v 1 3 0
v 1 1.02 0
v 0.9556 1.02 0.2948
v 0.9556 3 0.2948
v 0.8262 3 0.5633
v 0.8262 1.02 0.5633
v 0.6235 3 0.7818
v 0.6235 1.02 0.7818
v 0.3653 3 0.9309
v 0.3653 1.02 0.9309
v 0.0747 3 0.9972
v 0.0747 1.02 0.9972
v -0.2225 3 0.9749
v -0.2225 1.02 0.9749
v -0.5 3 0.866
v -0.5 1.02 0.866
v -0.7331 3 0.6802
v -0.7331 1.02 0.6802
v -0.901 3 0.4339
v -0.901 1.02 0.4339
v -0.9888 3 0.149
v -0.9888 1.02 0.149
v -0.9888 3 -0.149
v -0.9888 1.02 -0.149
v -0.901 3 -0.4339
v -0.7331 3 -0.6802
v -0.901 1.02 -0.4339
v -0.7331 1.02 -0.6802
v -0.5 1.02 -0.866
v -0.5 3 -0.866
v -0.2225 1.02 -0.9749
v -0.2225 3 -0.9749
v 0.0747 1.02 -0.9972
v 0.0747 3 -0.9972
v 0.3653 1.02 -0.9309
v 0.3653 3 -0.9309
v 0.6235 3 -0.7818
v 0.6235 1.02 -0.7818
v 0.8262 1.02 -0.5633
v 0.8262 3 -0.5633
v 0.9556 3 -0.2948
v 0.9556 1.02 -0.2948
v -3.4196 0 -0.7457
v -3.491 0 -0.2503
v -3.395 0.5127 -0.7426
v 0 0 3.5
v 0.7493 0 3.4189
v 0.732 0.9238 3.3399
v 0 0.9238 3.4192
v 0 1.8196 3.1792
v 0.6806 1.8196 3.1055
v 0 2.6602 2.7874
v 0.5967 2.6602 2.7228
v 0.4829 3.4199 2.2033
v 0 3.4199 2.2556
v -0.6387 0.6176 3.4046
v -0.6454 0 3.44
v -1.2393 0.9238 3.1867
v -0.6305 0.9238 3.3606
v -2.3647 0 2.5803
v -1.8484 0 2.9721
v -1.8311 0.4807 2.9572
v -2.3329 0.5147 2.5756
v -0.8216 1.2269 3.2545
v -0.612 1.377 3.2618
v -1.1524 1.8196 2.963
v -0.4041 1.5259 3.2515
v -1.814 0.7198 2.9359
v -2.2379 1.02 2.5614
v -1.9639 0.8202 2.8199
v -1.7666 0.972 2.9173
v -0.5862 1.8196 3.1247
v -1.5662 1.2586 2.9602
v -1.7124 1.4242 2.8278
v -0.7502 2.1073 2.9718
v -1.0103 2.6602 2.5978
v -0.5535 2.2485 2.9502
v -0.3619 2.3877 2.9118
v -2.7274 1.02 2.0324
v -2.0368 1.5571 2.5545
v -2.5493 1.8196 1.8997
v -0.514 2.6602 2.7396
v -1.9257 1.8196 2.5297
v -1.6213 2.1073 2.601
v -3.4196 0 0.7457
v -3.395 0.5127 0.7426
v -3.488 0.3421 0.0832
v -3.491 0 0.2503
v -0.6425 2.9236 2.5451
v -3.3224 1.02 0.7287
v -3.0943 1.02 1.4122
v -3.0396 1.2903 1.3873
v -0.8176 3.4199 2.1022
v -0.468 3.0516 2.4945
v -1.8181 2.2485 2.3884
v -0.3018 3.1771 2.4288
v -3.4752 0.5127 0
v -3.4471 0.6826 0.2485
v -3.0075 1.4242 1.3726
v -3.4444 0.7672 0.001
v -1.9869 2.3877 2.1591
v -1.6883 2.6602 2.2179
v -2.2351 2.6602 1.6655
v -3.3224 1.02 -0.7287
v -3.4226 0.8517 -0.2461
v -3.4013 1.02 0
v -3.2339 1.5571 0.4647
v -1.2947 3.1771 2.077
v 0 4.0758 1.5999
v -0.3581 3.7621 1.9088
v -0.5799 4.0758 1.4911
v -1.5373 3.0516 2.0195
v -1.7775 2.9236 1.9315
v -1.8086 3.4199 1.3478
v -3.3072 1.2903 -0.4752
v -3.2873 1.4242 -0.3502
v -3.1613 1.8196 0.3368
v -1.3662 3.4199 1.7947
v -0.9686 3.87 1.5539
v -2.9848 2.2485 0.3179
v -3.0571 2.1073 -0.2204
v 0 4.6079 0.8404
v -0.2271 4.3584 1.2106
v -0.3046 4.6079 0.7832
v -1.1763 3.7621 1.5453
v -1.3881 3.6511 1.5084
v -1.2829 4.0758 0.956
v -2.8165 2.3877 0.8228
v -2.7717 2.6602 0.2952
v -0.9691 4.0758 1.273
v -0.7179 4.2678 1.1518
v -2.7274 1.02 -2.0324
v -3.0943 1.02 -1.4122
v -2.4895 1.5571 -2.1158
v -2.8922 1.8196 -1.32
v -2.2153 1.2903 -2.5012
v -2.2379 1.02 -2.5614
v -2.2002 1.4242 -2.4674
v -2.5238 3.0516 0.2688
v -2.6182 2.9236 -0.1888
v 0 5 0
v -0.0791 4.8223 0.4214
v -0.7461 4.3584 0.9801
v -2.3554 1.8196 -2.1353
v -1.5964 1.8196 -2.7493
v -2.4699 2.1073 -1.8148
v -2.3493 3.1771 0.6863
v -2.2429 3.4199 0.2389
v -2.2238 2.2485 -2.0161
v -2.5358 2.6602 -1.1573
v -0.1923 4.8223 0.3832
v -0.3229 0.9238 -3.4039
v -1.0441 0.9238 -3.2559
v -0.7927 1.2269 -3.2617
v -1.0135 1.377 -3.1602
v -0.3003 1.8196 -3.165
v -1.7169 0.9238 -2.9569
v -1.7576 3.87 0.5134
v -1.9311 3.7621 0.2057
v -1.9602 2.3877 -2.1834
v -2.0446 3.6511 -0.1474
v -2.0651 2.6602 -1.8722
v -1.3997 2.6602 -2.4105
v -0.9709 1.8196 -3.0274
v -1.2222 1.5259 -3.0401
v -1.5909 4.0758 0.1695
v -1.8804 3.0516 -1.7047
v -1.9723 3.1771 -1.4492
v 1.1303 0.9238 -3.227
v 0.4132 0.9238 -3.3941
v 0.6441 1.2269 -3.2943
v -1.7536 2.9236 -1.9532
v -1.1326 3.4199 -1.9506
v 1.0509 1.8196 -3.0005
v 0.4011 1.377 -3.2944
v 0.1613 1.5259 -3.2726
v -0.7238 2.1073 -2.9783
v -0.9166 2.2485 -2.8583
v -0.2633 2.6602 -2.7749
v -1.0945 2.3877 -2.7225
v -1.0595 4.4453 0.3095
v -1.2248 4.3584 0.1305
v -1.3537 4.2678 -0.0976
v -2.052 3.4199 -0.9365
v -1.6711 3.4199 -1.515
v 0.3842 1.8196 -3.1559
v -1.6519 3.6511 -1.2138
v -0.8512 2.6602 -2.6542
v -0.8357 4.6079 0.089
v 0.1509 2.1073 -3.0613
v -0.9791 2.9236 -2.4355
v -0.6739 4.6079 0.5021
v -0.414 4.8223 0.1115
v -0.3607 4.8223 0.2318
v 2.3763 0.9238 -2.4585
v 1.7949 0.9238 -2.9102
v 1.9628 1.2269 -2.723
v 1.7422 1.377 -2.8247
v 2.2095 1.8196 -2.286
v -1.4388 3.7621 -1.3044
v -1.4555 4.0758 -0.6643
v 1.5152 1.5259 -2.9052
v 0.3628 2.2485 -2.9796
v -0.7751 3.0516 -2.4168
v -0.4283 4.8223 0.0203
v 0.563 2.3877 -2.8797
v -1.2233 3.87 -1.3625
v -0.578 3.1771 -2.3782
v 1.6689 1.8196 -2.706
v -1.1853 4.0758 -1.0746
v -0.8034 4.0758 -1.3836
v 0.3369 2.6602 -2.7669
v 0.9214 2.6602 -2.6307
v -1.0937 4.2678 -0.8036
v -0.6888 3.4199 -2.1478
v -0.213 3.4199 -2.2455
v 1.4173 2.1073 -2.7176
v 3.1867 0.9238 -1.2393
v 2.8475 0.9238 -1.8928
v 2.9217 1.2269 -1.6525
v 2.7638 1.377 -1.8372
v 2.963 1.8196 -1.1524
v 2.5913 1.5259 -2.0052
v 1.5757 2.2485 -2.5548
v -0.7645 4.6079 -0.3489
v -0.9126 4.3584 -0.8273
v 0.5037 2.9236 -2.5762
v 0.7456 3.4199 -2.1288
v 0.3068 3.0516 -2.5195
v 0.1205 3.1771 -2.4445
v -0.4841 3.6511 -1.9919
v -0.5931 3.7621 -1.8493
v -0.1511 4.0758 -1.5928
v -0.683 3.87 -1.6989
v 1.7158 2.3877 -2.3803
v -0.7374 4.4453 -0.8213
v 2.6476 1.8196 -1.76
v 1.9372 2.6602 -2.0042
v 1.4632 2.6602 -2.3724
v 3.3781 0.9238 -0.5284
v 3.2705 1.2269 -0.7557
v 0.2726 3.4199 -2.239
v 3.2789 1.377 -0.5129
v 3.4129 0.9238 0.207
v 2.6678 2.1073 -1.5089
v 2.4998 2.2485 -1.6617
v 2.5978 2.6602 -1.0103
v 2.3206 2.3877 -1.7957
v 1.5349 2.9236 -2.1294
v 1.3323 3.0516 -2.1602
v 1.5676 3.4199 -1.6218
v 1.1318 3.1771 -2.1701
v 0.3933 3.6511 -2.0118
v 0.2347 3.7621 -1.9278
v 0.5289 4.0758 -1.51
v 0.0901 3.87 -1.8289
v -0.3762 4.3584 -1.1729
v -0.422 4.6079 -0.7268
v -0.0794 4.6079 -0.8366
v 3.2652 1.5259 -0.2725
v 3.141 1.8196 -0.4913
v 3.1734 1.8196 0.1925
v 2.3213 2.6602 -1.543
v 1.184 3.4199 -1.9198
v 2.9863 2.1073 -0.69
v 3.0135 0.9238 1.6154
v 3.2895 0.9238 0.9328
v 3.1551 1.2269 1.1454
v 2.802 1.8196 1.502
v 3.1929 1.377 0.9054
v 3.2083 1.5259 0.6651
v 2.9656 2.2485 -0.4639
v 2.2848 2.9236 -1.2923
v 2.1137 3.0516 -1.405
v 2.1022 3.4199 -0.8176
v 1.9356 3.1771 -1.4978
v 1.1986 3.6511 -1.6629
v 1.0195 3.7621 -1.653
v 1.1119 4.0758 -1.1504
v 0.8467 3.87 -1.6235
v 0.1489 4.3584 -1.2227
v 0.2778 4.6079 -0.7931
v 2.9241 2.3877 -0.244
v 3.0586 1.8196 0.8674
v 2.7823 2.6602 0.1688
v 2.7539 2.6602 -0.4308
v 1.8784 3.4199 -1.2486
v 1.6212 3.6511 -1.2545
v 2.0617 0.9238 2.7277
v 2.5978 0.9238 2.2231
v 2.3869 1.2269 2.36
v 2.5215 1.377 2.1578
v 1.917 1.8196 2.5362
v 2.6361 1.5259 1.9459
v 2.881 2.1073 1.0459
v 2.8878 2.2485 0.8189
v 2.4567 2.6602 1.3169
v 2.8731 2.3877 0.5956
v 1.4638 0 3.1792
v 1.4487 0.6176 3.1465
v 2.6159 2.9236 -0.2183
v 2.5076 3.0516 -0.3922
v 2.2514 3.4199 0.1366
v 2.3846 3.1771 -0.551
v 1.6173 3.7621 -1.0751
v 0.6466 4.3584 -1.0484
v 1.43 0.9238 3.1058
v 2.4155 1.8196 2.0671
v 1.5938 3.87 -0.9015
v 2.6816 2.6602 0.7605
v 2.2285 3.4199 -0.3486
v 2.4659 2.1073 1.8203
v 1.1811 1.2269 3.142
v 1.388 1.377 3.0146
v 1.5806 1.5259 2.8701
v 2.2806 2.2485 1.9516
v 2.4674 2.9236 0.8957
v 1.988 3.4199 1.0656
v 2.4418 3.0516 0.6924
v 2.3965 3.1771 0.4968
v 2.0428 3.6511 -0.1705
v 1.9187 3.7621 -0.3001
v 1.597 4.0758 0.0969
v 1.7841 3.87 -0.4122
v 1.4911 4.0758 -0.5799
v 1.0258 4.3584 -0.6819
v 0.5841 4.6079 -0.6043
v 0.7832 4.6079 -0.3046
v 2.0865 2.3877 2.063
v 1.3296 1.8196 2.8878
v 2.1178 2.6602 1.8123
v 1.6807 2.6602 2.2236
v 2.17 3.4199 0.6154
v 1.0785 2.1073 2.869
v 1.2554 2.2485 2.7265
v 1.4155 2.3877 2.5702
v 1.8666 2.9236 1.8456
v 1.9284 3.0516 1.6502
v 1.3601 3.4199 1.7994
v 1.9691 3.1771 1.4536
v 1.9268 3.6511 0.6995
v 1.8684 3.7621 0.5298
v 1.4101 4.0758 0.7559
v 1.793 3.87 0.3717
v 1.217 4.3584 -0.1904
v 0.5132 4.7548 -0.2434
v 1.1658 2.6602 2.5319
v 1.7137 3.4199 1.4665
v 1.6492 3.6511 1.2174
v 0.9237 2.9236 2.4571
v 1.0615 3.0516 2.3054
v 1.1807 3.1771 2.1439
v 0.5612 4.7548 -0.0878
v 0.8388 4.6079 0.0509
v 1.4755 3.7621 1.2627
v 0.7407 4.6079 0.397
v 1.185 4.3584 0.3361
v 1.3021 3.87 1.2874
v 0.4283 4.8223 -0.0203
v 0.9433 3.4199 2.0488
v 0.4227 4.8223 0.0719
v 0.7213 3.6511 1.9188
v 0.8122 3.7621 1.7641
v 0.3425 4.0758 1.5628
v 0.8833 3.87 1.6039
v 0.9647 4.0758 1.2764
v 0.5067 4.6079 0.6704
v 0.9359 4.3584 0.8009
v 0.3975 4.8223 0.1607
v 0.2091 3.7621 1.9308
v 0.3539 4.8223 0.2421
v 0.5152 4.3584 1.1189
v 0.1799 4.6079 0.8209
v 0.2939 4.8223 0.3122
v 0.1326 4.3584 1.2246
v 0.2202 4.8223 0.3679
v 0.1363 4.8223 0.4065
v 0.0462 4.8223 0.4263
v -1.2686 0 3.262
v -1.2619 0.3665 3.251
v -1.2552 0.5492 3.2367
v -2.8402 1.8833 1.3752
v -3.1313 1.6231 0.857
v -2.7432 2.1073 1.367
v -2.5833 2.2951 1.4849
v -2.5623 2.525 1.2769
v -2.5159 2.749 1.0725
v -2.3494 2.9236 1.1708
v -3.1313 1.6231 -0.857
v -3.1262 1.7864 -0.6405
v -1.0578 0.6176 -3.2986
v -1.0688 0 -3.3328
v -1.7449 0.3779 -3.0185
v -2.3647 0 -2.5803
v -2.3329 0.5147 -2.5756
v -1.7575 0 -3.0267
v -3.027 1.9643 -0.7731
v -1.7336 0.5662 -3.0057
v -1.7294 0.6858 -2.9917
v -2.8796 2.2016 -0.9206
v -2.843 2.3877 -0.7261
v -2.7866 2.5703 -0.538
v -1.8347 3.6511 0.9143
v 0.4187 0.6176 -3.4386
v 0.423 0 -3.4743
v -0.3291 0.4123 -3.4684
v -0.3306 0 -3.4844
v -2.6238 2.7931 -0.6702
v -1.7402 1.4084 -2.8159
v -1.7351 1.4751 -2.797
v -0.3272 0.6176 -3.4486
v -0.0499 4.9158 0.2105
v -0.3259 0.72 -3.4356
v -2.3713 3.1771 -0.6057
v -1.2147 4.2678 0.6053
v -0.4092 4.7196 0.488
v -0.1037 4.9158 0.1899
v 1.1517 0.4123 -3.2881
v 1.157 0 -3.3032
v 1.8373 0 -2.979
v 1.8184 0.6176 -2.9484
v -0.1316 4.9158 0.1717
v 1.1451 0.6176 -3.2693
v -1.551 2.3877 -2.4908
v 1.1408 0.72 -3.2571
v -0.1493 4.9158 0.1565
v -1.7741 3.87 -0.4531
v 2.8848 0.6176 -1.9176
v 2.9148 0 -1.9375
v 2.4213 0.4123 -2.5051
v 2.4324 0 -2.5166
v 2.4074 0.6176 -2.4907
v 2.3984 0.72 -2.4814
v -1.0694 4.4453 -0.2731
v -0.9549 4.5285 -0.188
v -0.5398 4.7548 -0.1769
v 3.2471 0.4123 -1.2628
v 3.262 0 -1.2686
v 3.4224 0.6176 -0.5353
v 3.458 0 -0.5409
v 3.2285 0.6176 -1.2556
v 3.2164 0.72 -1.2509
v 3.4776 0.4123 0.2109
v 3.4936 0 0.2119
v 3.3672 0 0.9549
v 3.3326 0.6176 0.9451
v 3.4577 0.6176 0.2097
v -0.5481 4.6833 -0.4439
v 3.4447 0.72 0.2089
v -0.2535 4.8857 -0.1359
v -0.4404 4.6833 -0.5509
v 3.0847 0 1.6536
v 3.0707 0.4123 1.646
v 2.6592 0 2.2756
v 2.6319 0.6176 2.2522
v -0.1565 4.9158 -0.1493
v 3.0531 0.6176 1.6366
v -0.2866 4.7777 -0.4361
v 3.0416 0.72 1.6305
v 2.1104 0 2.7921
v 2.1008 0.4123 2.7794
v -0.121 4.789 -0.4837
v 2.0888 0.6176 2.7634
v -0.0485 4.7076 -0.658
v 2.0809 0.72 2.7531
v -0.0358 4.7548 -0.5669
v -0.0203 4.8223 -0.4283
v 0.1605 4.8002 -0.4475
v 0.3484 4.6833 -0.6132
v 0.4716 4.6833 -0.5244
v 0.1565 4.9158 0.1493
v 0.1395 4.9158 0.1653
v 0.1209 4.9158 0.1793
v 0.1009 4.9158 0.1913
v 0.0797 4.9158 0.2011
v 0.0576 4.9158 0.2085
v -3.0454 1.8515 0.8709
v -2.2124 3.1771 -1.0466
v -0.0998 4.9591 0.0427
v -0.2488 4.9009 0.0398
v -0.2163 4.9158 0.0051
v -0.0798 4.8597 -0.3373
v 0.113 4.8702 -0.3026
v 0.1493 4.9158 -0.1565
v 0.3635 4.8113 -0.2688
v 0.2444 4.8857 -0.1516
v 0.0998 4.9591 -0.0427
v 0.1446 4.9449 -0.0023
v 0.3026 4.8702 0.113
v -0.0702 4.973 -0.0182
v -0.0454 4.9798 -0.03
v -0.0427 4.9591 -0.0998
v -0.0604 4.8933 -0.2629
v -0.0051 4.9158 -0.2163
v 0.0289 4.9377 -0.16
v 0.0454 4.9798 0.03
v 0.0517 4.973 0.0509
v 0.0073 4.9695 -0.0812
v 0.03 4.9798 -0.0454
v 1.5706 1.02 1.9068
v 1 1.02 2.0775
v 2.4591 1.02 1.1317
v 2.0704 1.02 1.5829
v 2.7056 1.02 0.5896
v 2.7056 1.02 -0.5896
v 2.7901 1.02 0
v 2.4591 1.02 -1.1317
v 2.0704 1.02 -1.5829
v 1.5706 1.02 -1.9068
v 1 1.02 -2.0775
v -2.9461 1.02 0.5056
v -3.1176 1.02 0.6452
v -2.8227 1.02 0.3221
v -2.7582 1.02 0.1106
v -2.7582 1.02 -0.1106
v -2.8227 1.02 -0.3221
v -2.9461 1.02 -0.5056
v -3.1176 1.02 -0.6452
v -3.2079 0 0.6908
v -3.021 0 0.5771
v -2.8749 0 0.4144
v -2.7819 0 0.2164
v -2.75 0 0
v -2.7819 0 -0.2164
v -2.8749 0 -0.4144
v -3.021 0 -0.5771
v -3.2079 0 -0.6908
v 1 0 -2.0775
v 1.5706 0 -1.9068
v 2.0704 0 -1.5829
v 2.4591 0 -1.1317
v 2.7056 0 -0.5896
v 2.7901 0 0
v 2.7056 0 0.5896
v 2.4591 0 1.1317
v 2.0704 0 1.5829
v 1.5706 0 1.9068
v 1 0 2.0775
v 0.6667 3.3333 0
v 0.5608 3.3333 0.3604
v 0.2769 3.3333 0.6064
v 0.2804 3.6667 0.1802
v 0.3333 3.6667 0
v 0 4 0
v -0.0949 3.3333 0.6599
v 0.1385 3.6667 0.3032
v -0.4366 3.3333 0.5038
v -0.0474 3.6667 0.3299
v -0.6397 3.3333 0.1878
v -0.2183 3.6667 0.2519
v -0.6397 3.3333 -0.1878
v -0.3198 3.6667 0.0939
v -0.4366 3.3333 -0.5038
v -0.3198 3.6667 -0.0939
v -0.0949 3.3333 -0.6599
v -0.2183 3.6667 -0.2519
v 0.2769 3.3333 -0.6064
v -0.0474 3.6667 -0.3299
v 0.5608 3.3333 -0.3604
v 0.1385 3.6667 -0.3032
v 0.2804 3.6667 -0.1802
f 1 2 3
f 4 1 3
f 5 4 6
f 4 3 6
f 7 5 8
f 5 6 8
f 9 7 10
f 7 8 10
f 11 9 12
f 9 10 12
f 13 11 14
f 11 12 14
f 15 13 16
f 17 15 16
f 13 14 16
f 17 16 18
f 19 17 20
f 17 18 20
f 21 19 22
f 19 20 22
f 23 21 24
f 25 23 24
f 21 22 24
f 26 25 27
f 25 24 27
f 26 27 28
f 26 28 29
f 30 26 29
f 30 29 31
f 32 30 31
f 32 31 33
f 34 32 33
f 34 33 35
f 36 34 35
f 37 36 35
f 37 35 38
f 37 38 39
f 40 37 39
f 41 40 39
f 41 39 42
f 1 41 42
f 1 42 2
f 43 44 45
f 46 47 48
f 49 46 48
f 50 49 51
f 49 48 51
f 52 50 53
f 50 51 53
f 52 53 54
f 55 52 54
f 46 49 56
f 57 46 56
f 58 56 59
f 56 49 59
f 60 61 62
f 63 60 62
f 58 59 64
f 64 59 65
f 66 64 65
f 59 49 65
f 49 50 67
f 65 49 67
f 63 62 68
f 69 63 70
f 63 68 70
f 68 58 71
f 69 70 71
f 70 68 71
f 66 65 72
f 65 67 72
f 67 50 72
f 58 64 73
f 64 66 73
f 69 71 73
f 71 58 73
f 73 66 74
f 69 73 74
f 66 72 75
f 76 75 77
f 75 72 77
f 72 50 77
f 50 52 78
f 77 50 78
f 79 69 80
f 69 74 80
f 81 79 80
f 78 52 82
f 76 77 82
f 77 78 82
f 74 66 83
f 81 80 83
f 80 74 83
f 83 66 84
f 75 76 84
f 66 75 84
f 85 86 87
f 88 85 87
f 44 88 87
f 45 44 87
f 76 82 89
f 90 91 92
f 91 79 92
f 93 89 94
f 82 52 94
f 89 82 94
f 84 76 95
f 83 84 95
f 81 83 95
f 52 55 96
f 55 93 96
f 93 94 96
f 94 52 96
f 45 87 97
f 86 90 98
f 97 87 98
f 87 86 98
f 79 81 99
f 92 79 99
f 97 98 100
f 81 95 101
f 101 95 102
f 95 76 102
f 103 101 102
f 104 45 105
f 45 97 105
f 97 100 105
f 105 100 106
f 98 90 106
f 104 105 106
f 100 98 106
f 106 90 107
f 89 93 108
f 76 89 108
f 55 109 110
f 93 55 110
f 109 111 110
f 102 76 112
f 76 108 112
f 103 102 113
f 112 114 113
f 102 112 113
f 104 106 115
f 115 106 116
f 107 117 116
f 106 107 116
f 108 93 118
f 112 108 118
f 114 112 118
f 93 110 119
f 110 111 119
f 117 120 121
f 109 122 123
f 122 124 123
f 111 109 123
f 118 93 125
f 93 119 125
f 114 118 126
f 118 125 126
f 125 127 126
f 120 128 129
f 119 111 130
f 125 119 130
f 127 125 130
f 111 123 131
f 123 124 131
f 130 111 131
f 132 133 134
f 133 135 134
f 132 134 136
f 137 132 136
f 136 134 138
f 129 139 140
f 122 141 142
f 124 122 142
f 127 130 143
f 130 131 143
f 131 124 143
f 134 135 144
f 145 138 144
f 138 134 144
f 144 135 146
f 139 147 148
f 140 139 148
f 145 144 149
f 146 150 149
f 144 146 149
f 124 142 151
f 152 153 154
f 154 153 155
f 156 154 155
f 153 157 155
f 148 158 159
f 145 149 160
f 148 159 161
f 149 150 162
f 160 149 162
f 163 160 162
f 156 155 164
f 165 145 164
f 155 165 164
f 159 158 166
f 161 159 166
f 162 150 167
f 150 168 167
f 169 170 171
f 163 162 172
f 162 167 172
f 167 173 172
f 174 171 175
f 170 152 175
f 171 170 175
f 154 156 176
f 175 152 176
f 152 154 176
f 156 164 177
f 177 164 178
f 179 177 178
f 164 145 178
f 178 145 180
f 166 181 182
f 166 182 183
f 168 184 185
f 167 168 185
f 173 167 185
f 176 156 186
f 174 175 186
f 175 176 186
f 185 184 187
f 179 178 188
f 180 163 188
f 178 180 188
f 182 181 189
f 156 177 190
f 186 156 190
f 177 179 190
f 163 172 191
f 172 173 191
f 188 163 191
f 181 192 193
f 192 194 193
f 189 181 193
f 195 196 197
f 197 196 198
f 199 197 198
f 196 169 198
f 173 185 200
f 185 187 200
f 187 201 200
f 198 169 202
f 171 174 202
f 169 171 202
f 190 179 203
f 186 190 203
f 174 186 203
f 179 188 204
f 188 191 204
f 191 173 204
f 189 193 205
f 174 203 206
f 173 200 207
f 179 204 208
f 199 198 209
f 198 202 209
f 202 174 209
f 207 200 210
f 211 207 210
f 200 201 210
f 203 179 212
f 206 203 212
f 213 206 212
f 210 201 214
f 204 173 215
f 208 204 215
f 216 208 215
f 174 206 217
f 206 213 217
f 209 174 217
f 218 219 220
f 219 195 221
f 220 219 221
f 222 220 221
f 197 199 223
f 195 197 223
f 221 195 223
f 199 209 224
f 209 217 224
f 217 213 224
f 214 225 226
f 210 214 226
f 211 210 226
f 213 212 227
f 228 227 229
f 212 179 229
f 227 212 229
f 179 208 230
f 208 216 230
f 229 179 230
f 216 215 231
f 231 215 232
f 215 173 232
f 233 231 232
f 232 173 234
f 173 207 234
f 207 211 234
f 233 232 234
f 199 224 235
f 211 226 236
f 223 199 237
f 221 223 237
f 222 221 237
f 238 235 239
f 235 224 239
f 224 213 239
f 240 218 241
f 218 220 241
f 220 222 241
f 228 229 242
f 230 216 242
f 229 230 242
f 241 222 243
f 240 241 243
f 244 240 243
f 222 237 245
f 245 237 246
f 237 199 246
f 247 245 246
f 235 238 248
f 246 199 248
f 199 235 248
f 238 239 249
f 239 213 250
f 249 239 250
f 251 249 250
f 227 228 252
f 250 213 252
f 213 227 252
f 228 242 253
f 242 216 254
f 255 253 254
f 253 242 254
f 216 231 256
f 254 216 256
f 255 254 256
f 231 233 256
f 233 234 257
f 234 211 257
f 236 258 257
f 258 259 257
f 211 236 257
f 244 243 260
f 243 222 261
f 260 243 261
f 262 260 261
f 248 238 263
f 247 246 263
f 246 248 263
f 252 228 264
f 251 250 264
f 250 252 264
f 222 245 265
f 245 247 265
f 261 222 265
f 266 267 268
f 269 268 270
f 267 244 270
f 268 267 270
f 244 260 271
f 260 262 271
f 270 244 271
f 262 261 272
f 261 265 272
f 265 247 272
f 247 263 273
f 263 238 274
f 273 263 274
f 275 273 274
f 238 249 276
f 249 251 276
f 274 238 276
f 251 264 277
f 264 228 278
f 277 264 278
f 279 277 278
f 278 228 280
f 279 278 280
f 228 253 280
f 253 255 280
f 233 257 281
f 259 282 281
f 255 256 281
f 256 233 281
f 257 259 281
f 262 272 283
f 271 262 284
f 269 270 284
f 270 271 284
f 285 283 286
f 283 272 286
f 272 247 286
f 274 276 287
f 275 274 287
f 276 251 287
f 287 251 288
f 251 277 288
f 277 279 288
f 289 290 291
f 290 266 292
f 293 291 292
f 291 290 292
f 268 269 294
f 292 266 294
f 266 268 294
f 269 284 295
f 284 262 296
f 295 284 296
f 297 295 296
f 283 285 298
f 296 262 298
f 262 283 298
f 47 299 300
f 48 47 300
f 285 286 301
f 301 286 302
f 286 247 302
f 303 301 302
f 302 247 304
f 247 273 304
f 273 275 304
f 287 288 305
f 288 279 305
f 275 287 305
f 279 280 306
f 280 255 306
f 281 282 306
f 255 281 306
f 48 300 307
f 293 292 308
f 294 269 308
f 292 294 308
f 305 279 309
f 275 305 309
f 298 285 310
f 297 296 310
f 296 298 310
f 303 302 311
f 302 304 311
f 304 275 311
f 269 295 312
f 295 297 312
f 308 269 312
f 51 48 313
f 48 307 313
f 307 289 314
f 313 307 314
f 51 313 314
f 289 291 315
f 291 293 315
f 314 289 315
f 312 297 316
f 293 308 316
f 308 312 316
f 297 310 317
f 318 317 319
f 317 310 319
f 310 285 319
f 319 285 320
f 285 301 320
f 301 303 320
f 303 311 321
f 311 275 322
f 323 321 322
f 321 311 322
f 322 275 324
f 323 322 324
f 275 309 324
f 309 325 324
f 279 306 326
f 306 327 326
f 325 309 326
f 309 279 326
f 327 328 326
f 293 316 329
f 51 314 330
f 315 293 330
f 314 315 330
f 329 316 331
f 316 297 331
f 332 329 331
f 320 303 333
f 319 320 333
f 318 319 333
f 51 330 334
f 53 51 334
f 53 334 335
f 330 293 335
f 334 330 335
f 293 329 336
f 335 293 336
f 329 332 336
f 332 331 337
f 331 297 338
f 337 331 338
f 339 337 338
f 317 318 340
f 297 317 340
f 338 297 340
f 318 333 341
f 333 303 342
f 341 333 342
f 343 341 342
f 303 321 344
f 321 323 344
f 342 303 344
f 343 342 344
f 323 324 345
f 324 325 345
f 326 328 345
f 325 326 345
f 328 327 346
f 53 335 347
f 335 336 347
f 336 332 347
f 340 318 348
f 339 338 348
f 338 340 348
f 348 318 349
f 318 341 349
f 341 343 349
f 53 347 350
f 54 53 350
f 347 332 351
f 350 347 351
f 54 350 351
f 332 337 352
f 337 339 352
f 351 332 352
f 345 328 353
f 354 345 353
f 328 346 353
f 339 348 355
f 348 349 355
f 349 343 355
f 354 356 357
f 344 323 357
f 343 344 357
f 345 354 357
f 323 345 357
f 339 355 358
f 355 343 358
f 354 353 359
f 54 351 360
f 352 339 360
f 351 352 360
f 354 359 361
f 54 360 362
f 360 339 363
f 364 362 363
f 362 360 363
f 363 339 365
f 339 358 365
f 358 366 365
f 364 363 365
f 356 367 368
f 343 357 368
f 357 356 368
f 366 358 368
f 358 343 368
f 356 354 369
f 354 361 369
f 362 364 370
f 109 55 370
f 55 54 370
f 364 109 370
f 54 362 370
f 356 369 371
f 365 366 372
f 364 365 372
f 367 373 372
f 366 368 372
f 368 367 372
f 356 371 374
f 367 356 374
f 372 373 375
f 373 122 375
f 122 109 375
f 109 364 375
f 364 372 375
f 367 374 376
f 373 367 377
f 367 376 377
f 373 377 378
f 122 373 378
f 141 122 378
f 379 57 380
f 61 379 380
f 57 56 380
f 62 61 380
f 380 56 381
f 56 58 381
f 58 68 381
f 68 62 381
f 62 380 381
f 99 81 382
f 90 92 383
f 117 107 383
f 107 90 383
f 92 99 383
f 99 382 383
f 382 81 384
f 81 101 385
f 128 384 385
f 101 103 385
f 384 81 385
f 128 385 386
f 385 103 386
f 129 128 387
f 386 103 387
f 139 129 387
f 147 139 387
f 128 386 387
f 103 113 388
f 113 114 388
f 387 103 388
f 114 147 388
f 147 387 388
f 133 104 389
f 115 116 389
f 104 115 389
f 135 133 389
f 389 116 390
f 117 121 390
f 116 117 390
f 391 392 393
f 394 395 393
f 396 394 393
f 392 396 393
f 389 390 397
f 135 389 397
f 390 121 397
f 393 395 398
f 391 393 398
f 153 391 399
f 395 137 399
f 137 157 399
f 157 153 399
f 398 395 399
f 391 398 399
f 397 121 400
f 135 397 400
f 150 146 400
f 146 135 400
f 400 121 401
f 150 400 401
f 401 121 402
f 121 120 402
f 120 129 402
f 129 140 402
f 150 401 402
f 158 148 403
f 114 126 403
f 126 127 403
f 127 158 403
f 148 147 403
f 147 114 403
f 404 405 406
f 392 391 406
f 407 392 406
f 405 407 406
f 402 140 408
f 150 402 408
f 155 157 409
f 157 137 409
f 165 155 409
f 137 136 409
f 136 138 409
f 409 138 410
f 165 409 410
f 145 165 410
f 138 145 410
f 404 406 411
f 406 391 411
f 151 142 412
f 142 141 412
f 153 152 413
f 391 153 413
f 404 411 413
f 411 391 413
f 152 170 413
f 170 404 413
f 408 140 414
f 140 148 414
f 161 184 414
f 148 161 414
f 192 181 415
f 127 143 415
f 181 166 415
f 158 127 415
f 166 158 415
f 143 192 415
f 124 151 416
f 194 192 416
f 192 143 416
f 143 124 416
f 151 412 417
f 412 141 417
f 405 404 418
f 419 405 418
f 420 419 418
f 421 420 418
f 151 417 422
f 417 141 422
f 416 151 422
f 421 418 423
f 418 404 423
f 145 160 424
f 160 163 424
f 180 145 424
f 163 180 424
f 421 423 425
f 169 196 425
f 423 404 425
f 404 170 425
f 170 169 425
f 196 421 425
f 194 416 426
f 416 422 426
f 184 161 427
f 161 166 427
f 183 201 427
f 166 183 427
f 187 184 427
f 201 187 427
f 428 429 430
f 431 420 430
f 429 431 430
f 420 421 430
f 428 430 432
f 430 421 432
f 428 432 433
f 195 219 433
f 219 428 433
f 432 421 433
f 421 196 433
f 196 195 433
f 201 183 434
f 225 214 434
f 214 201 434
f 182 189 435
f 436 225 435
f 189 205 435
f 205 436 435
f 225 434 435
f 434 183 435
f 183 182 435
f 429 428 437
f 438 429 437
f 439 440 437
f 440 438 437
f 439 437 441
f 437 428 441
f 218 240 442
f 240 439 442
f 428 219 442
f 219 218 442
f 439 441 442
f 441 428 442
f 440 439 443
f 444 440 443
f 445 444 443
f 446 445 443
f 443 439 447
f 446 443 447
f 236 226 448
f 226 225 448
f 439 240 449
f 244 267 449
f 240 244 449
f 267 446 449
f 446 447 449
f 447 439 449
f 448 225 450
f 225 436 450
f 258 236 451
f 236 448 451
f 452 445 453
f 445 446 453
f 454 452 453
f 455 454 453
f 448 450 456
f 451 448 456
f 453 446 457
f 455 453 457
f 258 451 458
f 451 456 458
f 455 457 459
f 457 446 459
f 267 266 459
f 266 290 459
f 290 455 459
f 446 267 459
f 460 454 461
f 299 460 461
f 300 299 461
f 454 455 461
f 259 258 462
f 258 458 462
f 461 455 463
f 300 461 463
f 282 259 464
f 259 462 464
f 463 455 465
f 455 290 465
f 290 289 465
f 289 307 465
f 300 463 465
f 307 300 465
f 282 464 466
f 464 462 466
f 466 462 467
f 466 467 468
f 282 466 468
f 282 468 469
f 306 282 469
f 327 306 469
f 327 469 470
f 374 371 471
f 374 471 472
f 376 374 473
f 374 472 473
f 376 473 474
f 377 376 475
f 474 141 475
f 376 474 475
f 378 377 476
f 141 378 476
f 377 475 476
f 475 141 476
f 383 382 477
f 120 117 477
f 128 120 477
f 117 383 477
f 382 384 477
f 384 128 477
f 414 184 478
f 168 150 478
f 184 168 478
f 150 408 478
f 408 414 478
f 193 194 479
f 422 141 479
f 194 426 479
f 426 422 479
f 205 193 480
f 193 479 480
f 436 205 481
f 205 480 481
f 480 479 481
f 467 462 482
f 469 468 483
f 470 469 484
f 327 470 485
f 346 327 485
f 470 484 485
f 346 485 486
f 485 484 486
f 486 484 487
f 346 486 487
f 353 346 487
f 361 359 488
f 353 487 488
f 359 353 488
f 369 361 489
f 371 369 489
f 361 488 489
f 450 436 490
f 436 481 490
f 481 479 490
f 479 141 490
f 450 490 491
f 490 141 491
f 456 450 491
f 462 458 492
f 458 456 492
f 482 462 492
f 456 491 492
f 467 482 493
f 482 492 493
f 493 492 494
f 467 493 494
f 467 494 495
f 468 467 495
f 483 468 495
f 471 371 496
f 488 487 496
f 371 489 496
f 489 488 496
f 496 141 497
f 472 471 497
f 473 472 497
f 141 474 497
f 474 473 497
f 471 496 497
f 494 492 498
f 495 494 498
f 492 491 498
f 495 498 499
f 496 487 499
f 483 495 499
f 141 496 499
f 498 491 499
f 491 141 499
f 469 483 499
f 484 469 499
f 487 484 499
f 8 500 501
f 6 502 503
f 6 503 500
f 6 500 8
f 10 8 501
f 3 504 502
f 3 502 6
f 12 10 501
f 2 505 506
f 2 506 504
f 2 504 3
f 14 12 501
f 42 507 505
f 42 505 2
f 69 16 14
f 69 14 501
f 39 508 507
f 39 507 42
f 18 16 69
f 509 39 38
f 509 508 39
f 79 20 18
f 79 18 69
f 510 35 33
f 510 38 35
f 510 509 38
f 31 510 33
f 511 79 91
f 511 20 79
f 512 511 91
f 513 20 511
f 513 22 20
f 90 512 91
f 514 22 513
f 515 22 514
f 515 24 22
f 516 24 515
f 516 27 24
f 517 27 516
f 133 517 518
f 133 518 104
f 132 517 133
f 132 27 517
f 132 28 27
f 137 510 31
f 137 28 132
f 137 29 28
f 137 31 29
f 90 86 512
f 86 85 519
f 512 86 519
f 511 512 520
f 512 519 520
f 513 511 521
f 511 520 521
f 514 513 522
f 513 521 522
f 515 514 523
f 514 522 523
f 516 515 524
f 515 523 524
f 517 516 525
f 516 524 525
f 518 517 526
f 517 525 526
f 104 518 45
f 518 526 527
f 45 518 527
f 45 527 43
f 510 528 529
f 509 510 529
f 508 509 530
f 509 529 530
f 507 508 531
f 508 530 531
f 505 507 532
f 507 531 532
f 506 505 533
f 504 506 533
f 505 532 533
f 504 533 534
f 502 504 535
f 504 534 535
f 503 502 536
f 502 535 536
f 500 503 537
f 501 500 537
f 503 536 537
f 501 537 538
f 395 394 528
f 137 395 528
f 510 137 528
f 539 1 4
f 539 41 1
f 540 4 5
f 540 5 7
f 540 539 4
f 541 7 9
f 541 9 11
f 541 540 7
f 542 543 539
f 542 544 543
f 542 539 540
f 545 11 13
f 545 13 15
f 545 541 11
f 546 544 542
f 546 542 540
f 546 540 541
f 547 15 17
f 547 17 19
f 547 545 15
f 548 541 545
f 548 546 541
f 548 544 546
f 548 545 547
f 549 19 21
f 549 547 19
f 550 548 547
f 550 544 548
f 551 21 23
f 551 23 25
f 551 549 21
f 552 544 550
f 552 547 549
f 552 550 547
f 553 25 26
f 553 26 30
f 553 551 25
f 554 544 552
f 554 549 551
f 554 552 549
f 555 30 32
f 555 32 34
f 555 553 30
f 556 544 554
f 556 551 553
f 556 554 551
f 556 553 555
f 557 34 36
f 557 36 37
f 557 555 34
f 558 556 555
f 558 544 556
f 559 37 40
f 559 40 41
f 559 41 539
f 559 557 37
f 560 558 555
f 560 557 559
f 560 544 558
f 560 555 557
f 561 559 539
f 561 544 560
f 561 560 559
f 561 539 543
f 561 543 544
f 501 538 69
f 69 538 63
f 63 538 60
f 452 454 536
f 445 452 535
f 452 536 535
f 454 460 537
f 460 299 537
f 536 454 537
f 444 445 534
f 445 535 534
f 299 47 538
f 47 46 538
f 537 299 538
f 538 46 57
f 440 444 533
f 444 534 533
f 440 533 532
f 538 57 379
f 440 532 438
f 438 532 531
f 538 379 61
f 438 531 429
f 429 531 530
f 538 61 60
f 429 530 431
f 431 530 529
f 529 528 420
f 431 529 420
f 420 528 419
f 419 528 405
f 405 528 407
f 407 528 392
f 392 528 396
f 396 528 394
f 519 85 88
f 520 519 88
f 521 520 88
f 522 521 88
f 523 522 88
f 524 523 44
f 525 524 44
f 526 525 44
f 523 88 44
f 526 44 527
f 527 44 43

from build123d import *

# Parameters (mm, degrees)
SKETCH2_R          = 1
CUT_EXTRUDE1_DEPTH = 4
CHAMFER1_SIZE      = 1
CUT_EXTRUDE4_DEPTH = 1.02


with BuildPart() as part:
    # Sketch1 → Revolve1 (revolve)
    with BuildSketch(Plane(origin=(0, 0, 0), x_dir=(0, 0, -1), z_dir=(1, 0, 0))):
        with BuildLine():
            Line((0, 5), (0, 0))
            Line((0, 0), (-3.5, 0))
            ThreePointArc((-3.5, 0), (-2.538055577, 3.051638904), (0, 5))
        make_face()
    revolve(axis=Axis((0, 0, 0), (0, -1, 0)))

    # Sketch2 → Cut-Extrude1 (cut)
    with BuildSketch(Plane.XZ):
        Circle(SKETCH2_R)
    extrude(amount=-CUT_EXTRUDE1_DEPTH, mode=Mode.SUBTRACT)

    # Chamfer1
    chamfer1_edges = [part.edges().sort_by_distance(p)[0] for p in [
        (-1, 4, 0),
    ]]
    chamfer(chamfer1_edges, length=CHAMFER1_SIZE)

    # Sketch4 → Cut-Extrude4 (cut)
    with BuildSketch(Plane(origin=(0, 0, 0), x_dir=(1, 0, 0), z_dir=(0, 1, 0))):
        with BuildLine():
            Line((-3.5, 2.75), (1, 2.077470494))
            ThreePointArc((1, 2.077470494), (2.790063101, 0), (1, -2.077470494))
            Line((1, -2.077470494), (-3.5, -2.75))
            Line((-3.5, -2.75), (-3.5, -0.75))
            ThreePointArc((-3.5, -0.75), (-2.75, 0), (-3.5, 0.75))
            Line((-3.5, 0.75), (-3.5, 2.75))
        make_face()
    extrude(amount=CUT_EXTRUDE4_DEPTH, mode=Mode.SUBTRACT)


solid = part.part
